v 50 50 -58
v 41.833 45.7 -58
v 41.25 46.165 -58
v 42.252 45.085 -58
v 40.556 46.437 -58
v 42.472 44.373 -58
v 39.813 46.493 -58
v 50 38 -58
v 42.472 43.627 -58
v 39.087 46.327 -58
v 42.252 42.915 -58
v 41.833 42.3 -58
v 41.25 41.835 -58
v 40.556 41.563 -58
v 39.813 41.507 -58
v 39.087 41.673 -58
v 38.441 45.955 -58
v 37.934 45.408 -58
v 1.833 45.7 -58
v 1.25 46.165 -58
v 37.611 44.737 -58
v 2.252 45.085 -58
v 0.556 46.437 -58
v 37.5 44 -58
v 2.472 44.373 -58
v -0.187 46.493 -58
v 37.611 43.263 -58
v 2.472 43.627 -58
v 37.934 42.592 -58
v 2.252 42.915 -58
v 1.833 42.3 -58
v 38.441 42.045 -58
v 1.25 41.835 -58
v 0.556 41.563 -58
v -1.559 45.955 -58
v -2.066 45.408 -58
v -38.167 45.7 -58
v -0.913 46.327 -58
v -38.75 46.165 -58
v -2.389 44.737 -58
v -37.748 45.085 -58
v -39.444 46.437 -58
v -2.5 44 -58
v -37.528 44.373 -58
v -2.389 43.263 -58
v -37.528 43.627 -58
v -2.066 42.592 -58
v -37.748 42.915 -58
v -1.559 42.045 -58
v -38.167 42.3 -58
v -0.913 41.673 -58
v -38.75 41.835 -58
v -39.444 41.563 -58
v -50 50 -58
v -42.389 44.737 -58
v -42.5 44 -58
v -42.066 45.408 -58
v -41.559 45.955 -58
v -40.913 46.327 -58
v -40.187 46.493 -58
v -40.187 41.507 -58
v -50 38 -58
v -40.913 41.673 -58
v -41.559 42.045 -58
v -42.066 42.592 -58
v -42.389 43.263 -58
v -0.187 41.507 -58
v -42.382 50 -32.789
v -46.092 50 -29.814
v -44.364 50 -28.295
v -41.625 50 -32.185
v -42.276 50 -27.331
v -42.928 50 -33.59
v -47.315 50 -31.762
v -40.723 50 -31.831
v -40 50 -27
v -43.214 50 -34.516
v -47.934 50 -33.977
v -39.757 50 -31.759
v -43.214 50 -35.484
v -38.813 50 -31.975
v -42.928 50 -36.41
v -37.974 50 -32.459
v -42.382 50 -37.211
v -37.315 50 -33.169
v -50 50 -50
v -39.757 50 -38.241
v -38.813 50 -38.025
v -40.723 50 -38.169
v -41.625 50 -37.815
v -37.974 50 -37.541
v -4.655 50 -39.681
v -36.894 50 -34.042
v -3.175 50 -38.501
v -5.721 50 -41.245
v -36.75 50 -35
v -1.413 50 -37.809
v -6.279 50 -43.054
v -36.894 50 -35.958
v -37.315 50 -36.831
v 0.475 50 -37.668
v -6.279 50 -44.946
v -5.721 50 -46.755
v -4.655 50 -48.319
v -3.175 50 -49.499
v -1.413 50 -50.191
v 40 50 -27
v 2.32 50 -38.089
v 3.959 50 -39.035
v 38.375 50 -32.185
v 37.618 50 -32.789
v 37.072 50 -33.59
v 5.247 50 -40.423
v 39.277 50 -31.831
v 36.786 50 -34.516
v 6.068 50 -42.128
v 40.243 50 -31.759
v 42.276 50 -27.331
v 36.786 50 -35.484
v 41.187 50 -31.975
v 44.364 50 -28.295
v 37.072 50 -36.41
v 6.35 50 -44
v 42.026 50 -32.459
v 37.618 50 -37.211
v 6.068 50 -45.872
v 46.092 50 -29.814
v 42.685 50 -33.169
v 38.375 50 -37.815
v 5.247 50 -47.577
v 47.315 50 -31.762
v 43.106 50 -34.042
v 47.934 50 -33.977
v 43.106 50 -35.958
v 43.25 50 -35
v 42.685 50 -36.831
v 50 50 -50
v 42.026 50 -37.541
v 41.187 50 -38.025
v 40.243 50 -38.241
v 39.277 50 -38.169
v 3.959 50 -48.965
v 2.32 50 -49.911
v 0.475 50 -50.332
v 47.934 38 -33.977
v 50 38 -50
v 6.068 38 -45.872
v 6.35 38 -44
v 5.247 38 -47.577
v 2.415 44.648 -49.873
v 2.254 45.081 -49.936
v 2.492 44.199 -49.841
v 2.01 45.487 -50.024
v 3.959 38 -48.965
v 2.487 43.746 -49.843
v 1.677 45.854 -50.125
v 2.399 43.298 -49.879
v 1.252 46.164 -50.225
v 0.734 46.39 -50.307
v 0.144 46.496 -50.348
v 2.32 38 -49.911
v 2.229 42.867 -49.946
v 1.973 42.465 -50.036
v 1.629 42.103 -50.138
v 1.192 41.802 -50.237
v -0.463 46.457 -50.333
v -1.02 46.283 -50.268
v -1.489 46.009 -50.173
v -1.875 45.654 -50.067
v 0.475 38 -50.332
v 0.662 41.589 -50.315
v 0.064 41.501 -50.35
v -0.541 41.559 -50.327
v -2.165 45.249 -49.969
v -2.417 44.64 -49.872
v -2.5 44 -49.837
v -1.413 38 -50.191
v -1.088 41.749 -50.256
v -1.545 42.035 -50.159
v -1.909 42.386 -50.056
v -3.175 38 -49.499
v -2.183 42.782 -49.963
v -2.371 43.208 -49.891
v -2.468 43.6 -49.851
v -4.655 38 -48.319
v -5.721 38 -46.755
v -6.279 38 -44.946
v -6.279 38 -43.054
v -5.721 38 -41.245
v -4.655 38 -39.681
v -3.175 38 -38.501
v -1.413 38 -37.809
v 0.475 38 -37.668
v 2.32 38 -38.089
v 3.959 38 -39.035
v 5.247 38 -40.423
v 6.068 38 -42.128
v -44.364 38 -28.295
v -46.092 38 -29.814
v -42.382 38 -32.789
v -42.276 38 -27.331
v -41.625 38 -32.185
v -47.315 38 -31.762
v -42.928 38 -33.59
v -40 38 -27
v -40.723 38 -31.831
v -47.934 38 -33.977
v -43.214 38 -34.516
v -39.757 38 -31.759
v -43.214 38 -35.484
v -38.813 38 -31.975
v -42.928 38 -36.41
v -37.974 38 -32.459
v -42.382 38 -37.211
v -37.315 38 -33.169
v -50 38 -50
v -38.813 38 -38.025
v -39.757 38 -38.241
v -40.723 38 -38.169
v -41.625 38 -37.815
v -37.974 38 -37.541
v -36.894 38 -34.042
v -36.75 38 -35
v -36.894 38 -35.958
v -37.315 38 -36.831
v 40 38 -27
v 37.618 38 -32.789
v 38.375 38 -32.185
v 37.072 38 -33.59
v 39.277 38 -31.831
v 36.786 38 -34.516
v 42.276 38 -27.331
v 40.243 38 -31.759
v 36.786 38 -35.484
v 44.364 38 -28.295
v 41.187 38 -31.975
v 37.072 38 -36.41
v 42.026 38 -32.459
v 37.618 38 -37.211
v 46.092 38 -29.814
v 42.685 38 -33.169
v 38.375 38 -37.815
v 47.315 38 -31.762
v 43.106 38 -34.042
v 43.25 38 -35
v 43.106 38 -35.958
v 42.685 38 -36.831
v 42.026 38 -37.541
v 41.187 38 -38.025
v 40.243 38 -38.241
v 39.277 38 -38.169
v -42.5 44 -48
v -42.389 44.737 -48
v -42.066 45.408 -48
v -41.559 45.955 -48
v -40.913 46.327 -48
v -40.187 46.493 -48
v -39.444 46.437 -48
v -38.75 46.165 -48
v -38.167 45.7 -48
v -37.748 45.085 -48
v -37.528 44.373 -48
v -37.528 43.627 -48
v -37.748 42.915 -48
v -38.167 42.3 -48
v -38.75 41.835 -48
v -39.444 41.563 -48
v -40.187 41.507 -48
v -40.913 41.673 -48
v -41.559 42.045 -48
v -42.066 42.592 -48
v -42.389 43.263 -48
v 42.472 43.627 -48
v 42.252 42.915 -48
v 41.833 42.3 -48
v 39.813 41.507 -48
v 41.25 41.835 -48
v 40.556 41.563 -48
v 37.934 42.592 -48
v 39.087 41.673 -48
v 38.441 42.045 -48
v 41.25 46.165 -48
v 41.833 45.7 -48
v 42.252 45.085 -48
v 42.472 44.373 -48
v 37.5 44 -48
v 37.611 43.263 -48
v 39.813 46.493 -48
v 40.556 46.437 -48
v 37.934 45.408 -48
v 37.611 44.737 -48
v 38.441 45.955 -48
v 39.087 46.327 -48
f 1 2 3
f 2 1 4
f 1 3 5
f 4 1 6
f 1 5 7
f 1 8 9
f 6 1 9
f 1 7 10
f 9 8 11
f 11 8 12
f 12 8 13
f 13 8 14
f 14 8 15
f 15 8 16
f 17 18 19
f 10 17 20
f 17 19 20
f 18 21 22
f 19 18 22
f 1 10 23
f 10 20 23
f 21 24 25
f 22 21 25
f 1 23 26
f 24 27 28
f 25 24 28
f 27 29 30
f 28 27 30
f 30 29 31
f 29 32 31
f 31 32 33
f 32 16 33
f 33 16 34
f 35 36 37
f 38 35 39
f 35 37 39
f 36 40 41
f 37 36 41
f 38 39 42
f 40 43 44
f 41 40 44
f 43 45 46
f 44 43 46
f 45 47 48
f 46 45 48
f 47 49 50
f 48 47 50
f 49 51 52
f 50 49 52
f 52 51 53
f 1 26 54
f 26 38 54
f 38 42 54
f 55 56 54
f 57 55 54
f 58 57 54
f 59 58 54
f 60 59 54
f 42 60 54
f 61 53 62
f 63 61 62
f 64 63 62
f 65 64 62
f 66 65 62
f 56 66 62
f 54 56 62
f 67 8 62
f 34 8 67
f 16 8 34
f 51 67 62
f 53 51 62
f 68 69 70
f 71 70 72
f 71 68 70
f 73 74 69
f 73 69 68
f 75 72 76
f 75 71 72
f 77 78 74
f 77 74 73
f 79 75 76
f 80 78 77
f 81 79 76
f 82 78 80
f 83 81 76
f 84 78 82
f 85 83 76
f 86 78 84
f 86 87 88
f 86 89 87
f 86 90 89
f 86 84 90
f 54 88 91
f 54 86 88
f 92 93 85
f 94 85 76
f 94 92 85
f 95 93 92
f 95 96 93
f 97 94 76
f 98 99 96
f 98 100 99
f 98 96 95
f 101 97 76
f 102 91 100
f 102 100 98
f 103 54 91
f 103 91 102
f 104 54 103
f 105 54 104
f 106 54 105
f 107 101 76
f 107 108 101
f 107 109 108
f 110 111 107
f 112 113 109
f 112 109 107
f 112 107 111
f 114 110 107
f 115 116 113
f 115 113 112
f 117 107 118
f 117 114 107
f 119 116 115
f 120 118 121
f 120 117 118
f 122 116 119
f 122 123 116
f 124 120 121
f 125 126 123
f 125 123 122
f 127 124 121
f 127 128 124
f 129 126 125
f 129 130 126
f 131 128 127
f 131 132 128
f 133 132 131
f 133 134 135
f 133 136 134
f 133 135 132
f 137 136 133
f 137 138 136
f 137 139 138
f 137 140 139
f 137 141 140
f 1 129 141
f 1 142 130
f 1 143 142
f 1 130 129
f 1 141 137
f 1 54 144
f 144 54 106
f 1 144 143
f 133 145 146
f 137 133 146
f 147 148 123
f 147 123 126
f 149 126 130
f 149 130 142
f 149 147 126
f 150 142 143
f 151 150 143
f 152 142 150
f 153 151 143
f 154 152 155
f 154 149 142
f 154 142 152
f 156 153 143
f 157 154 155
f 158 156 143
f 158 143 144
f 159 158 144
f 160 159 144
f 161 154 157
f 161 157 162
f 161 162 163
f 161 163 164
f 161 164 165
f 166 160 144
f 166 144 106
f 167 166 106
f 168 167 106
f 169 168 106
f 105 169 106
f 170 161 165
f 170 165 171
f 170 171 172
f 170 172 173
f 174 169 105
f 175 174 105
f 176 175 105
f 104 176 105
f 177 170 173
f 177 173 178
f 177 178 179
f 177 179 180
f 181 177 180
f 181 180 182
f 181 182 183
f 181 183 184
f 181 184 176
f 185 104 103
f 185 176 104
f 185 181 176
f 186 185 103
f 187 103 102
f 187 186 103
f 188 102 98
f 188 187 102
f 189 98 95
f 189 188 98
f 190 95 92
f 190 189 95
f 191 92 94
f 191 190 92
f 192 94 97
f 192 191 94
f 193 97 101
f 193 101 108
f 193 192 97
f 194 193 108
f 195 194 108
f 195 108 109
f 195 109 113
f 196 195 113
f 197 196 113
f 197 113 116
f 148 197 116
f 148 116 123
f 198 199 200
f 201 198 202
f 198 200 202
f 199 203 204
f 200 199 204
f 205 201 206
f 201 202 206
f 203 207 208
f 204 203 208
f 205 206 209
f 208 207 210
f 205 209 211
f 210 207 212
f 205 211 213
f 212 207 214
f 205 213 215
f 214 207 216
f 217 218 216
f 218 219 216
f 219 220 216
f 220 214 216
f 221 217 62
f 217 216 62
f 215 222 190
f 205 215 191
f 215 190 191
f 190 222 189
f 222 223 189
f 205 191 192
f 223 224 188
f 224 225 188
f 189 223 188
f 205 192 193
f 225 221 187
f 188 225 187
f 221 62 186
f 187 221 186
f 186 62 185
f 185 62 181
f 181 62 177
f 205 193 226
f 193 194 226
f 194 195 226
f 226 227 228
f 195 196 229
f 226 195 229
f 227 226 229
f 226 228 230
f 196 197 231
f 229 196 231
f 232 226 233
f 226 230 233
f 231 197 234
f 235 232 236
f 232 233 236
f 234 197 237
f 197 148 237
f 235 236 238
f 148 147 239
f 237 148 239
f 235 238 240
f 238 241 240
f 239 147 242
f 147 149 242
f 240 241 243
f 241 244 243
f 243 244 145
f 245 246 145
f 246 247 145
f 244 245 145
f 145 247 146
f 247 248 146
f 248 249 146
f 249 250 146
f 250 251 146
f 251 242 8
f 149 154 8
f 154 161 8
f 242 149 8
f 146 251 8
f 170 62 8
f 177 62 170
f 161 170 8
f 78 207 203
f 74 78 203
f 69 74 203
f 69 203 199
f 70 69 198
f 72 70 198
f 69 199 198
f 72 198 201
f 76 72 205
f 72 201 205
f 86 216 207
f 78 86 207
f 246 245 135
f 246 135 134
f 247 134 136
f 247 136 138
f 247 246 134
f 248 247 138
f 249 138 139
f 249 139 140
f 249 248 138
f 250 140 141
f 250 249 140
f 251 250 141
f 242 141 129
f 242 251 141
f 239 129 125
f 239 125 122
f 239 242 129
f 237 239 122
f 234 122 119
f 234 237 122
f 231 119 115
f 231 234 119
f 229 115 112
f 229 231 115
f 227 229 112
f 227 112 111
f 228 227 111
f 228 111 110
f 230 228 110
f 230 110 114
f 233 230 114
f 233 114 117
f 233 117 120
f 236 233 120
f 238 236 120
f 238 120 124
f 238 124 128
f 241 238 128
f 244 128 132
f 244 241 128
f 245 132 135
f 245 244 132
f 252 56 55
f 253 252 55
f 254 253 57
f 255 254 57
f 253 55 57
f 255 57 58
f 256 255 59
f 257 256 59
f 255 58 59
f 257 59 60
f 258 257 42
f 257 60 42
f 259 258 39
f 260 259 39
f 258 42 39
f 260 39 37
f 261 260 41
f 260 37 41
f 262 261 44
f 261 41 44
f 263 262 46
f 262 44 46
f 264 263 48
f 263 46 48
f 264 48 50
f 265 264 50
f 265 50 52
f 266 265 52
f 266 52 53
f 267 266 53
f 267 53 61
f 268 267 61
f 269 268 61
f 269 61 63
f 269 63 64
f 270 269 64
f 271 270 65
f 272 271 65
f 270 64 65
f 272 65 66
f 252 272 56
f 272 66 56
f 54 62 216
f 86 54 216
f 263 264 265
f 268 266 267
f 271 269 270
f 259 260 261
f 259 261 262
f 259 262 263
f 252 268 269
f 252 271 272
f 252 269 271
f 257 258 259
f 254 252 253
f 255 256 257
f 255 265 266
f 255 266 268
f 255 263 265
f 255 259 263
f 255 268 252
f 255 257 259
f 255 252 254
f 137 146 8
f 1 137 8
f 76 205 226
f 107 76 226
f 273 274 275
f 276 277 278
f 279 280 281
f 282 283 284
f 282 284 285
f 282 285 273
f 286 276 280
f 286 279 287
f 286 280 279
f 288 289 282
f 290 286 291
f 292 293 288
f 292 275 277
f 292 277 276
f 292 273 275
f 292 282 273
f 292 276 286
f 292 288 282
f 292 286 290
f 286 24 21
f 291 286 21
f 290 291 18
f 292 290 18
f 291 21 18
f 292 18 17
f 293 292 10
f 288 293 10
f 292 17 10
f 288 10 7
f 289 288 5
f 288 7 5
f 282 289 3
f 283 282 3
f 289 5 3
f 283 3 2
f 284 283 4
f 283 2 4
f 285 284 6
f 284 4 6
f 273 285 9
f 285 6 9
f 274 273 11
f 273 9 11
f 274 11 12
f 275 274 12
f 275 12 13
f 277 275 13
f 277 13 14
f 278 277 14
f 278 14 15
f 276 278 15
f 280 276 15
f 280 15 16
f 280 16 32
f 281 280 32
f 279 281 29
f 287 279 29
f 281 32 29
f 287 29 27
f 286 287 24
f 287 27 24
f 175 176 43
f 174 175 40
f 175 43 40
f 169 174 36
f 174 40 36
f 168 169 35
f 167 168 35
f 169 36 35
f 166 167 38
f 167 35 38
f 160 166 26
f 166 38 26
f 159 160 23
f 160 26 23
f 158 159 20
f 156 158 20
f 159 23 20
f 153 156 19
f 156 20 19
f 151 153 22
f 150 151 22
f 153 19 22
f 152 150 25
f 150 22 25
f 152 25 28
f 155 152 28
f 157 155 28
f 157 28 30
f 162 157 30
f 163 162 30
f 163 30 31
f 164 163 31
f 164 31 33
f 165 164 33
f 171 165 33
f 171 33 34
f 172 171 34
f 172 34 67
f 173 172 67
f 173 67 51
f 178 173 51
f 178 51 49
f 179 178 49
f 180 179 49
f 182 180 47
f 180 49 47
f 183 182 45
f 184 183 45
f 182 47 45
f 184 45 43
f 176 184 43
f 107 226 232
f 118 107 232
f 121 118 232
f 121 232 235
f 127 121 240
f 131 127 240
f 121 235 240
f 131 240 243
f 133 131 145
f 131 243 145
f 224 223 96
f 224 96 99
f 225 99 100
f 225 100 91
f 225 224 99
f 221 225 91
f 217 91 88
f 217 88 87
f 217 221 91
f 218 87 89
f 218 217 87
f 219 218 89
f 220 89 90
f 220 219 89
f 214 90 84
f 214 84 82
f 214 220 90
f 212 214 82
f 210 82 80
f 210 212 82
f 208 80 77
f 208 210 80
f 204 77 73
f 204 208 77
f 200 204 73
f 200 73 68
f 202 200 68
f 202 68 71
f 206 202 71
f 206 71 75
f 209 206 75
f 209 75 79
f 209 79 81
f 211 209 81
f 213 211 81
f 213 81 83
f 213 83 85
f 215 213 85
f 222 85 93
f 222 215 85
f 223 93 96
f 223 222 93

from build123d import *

# Parameters (mm, degrees)
SKETCH1_R           = 14
SKETCH1_R_2         = 5
BOSS_EXTRUDE1_DEPTH = 38
SKETCH2_R           = 6.35
SKETCH2_R_2         = 3.25
BOSS_EXTRUDE2_DEPTH = 12
SKETCH3_R           = 2.5
CUT_EXTRUDE6_DEPTH  = 10


with BuildPart() as part:
    # Sketch1 → Boss-Extrude1 (new body)
    with BuildSketch(Plane(origin=(0, 0, 0), x_dir=(1, 0, 0), z_dir=(0, 1, 0))):
        with BuildLine():
            Line((40, 57), (-40, 57))
            ThreePointArc((-40, 57), (-58.987886037, 46.111263827), (-59.17994648, 24.223653075))
            Line((-59.17994648, 24.223653075), (-47.255332989, 3))
            Line((-47.255332989, 3), (-32.311027529, 3))
            ThreePointArc((-32.311027529, 3), (32.415238263, -1.501608583), (-32.45, 0))
            Line((-32.45, 0), (-47.255332989, 0))
            Line((-47.255332989, 0), (-47.255332989, -10))
            Line((-47.255332989, -10), (-41.255332989, -10))
            ThreePointArc((-41.255332989, -10), (-4.643586709, -42.195255687), (38.093342034, -18.732319468))
            Line((38.093342034, -18.732319468), (59.742132503, 25.291848568))
            ThreePointArc((59.742132503, 25.291848568), (58.675911377, 46.627997861), (40, 57))
        make_face()
        with Locations((-40, 35)):
            Circle(SKETCH1_R, mode=Mode.SUBTRACT)
        with Locations((0, 44)):
            Circle(SKETCH1_R_2, mode=Mode.SUBTRACT)
        with Locations((40, 35)):
            Circle(SKETCH1_R, mode=Mode.SUBTRACT)
    extrude(amount=BOSS_EXTRUDE1_DEPTH)


with BuildPart() as body_2:
    # Sketch2 → Boss-Extrude2 (new body)
    with BuildSketch(Plane(origin=(0, 38, 0), x_dir=(1, 0, 0), z_dir=(0, 1, 0))):
        with BuildLine():
            Line((-40, 27), (40, 27))
            ThreePointArc((40, 27), (45.282843577, 28.992374534), (47.934336402, 33.977109066))
            Line((47.934336402, 33.977109066), (50, 50))
            Line((50, 50), (50, 58))
            Line((50, 58), (-50, 58))
            Line((-50, 58), (-50, 50))
            Line((-50, 50), (-47.934336402, 33.977109066))
            ThreePointArc((-47.934336402, 33.977109066), (-45.282843577, 28.992374534), (-40, 27))
        make_face()
        with Locations((0, 44)):
            Circle(SKETCH2_R, mode=Mode.SUBTRACT)
        with Locations((-40, 35)):
            Circle(SKETCH2_R_2, mode=Mode.SUBTRACT)
        with Locations((40, 35)):
            Circle(SKETCH2_R_2, mode=Mode.SUBTRACT)
    extrude(amount=BOSS_EXTRUDE2_DEPTH)

    # Sketch3 → Cut-Extrude6 (cut)
    with BuildSketch(Plane(origin=(0, 0, -58), x_dir=(-1, 0, 0), z_dir=(0, 0, -1))):
        with Locations((0, 44)):
            Circle(SKETCH3_R)
        with Locations((40, 44)):
            Circle(SKETCH3_R)
        with Locations((-40, 44)):
            Circle(SKETCH3_R)
    extrude(amount=-CUT_EXTRUDE6_DEPTH, mode=Mode.SUBTRACT)


solid = body_2.part
